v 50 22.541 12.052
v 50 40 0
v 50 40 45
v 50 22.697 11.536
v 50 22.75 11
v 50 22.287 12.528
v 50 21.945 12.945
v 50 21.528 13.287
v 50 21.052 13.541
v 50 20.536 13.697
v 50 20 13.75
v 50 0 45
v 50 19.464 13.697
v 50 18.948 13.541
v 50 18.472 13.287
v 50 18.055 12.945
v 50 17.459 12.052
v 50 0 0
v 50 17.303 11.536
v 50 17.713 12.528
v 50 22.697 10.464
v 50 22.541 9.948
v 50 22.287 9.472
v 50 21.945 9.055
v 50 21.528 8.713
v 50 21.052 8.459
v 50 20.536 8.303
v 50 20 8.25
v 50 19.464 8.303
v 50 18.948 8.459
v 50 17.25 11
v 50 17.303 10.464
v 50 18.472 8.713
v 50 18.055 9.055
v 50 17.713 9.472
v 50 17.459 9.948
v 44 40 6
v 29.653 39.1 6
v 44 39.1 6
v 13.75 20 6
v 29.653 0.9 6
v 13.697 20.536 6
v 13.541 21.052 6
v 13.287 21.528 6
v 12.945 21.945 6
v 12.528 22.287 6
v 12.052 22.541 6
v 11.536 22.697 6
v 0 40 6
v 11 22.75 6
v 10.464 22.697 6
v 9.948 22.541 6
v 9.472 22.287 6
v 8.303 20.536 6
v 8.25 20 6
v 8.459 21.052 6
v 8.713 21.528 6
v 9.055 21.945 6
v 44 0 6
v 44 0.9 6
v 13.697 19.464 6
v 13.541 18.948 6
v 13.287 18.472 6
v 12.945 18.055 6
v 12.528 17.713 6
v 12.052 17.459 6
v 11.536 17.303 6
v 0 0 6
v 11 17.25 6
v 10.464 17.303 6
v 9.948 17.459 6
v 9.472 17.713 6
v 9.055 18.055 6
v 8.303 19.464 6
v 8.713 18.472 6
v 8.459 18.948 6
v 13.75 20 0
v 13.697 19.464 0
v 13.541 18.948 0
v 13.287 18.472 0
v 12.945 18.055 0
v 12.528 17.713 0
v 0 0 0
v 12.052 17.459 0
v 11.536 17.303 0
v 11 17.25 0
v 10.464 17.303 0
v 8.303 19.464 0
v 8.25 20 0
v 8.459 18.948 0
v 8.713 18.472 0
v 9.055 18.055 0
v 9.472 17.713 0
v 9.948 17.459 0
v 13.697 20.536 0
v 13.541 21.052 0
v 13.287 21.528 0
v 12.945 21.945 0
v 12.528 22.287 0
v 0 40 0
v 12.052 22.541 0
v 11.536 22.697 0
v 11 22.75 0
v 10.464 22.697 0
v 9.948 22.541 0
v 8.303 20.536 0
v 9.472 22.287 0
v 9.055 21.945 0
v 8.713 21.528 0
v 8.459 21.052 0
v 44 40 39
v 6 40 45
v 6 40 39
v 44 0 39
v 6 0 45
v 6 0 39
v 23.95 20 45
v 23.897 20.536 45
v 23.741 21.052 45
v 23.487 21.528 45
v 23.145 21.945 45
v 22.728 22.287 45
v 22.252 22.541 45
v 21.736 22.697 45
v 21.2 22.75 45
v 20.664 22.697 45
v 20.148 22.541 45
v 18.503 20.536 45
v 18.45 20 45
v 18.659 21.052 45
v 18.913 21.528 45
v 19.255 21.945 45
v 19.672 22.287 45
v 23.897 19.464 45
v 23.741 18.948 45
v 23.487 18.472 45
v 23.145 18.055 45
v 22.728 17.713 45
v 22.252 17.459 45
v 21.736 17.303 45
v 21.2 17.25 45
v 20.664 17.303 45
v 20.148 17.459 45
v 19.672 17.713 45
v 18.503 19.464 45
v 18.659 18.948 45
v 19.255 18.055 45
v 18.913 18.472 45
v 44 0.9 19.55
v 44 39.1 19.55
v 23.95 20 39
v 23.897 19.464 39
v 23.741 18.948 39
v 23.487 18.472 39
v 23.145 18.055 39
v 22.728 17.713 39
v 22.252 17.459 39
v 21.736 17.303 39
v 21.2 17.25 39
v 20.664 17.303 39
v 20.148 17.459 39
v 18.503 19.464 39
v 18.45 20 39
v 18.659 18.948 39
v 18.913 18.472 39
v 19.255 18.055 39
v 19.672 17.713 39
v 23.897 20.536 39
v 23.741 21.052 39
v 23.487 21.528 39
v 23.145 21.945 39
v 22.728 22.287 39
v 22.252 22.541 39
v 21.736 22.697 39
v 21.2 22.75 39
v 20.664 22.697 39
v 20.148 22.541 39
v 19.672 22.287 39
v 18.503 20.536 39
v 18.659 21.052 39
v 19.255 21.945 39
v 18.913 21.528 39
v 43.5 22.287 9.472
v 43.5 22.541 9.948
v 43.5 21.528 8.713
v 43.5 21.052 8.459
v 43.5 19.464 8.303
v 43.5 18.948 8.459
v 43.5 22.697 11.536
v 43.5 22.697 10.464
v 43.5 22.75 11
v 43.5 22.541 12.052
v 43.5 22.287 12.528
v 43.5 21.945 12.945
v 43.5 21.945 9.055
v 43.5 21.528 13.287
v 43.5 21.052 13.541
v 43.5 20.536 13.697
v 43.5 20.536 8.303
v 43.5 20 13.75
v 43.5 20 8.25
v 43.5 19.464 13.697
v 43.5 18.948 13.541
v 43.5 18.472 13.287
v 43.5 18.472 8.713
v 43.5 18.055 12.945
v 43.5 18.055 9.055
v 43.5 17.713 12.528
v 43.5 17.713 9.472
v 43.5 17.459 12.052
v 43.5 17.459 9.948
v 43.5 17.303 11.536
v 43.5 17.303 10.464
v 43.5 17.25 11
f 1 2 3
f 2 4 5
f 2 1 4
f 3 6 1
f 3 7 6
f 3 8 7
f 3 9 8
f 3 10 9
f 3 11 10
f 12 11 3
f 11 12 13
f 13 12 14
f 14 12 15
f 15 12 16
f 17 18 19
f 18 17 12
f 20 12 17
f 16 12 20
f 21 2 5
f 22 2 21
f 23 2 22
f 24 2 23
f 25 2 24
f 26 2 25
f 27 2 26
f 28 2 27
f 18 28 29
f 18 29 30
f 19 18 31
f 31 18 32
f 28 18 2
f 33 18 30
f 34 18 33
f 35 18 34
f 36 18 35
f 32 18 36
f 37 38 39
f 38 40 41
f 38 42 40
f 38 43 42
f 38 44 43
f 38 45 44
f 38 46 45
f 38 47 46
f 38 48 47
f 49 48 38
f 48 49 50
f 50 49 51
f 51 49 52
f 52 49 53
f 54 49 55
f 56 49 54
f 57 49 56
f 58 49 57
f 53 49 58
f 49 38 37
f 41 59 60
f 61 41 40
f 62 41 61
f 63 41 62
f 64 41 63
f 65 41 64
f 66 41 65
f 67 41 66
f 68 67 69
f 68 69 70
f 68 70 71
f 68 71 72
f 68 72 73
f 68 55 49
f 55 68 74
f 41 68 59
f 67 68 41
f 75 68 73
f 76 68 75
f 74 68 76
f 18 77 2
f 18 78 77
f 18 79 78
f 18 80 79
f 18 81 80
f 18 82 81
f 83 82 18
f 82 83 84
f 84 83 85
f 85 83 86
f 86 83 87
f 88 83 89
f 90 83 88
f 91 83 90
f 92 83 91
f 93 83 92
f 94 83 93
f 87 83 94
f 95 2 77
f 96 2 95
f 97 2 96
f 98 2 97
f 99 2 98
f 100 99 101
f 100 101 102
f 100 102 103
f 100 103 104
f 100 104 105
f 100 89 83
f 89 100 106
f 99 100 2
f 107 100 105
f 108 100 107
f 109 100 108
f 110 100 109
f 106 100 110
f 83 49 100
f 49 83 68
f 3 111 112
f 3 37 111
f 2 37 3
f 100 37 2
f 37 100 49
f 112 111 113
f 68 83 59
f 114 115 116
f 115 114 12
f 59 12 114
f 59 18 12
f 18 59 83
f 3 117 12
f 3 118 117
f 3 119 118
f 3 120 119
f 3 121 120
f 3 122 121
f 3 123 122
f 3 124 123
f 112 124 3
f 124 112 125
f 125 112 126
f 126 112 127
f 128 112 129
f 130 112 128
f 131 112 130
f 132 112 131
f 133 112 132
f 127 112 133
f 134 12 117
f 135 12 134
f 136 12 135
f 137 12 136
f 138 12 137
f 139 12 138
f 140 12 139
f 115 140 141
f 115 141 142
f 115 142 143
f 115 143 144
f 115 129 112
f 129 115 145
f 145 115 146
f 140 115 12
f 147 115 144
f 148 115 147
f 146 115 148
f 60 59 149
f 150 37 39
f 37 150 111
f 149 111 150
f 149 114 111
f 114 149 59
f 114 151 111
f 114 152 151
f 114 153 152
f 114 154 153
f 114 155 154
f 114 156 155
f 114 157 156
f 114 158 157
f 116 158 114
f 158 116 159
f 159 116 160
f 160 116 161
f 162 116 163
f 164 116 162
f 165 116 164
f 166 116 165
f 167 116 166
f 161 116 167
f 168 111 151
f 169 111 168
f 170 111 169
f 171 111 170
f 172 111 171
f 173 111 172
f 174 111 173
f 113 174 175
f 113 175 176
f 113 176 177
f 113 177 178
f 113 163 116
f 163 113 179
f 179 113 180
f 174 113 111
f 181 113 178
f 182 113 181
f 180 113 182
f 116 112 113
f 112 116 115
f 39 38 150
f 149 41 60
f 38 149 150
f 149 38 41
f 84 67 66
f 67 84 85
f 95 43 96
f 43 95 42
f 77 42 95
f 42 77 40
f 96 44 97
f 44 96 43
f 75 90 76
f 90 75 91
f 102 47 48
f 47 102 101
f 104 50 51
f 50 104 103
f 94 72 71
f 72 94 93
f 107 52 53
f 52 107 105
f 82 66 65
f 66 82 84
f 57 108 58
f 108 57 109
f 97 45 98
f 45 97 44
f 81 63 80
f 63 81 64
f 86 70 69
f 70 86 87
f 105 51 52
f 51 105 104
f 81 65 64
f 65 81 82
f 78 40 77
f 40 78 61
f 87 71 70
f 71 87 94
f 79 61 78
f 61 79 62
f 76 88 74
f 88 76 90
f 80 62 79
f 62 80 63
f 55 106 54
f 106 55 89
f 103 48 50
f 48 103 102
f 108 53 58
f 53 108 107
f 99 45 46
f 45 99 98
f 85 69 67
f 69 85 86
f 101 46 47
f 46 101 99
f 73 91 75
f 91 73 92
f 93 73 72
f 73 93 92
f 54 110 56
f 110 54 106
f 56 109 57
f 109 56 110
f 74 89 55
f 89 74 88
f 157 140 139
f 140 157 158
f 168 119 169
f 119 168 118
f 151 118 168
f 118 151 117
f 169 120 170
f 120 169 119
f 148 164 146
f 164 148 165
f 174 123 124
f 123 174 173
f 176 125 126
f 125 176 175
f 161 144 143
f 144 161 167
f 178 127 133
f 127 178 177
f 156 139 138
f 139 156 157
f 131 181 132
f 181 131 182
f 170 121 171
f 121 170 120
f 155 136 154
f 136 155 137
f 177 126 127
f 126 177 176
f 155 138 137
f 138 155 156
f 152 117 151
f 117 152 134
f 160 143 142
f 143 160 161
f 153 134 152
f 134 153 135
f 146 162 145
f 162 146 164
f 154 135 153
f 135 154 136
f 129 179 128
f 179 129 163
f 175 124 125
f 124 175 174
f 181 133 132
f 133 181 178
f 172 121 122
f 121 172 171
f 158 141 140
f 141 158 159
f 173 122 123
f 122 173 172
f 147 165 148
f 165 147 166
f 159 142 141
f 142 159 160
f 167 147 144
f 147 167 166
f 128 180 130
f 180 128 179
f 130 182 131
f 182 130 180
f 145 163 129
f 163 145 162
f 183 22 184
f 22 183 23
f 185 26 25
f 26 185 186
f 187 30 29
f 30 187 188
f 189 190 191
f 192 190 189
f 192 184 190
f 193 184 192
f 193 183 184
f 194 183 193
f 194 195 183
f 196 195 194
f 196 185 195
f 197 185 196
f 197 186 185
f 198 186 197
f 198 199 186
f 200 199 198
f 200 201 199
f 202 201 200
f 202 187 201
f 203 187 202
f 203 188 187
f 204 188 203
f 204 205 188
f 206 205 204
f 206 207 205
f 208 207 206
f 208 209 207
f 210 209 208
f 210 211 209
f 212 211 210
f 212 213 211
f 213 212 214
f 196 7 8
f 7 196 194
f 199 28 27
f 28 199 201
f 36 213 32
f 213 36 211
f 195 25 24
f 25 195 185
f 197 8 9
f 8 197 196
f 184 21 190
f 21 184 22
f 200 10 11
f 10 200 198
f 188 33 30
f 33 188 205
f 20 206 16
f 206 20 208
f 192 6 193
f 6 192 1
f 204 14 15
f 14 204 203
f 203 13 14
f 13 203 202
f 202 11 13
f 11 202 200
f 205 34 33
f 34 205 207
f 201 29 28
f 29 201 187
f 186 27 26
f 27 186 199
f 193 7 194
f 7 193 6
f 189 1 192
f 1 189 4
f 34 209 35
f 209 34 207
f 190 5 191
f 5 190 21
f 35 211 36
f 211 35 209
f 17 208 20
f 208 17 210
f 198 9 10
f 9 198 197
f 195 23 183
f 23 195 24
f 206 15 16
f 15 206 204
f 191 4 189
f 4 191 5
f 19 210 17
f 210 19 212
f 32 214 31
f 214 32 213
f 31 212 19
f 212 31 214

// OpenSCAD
$fn = 32;

// ----------------------------------------------------------------------
// Z-bracket: 50 x 40 x 45 mm
// ----------------------------------------------------------------------

// --- parameters (mm) ---
lower_leg = 50;           // lower foot length, X
upper_leg = 38;           // upper foot length, X
bracket_w = 40;           // bracket width, Y
offset_h = 45;            // overall rise, Z
sheet_t = 6;              // plate thickness
hole_d = 5.5;             // clearance for M5
rib_len = 15.3;           // gusset leg
rib_sink = 0.9;           // gusset overlap into the plates

module hole_z(px, py, z0) {
  translate([px, py, z0 - 0.5]) cylinder(h = sheet_t + 1, d = hole_d);
}
module hole_x(py, pz) {
  translate([-0.5, py, pz]) rotate([0, 90, 0]) cylinder(h = sheet_t + 1, d = hole_d);
}
module gusset(x0) {
  translate([x0, bracket_w - rib_sink, 0])
    rotate([90, 0, 0])
      linear_extrude(height = bracket_w - 2 * rib_sink)
        polygon(points = [[rib_sink, sheet_t - rib_sink],
                          [rib_sink, sheet_t - rib_sink + rib_len],
                          [-rib_len, sheet_t - rib_sink]]);
}

difference() {
  union() {
    cube([lower_leg, bracket_w, sheet_t]);
    /* web, overlapping the lower foot */
    translate([lower_leg - sheet_t, 0, 0]) cube([sheet_t, bracket_w, offset_h]);
    /* upper foot, sunk into the web */
    translate([lower_leg - sheet_t - upper_leg, 0, offset_h - sheet_t]) cube([upper_leg + sheet_t, bracket_w, sheet_t]);
    gusset(lower_leg - sheet_t);
  }
  hole_z(11, 20, 0);
  translate([lower_leg - sheet_t - 22.8, 0, 0]) hole_z(0, 20, offset_h - sheet_t);
  translate([lower_leg - sheet_t, 0, 0]) hole_x(20, 11);
}
